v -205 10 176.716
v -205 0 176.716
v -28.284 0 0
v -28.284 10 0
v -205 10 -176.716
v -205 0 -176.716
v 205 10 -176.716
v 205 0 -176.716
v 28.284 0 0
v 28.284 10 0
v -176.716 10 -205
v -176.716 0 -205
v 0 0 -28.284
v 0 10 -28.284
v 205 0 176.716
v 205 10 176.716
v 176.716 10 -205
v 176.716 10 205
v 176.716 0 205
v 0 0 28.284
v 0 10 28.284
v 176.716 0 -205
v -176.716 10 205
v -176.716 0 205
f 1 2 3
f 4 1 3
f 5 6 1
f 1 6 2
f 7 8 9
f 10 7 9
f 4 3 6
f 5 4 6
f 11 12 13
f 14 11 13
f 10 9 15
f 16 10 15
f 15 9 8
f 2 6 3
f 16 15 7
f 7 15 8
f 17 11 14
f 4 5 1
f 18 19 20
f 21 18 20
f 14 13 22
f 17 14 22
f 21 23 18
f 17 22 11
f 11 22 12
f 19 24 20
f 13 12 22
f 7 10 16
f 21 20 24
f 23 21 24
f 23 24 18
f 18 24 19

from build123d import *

# Parameters (mm, degrees)
BOSS_EXTRUDE1_DEPTH   = 10
BOSS_EXTRUDE1_2_DEPTH = 10
BOSS_EXTRUDE1_3_DEPTH = 10
BOSS_EXTRUDE1_4_DEPTH = 10


with BuildPart() as part:
    # Sketch1 → Boss-Extrude1 (new body)
    with BuildSketch(Plane(origin=(0, 0, 0), x_dir=(1, 0, 0), z_dir=(0, 1, 0))):
        Polygon((-205, 176.715728753), (-205, -176.715728753), (-28.284271247, 0), align=None)
    extrude(amount=BOSS_EXTRUDE1_DEPTH)


with BuildPart() as body_2:
    # Sketch1 → Boss-Extrude1 2 (new body)
    with BuildSketch(Plane(origin=(0, 0, 0), x_dir=(1, 0, 0), z_dir=(0, 1, 0))):
        Polygon((-176.715728753, 205), (0, 28.284271247), (176.715728753, 205), align=None)
    extrude(amount=BOSS_EXTRUDE1_2_DEPTH)


with BuildPart() as body_3:
    # Sketch1 → Boss-Extrude1 3 (new body)
    with BuildSketch(Plane(origin=(0, 0, 0), x_dir=(1, 0, 0), z_dir=(0, 1, 0))):
        Polygon((205, 176.715728753), (28.284271247, 0), (205, -176.715728753), align=None)
    extrude(amount=BOSS_EXTRUDE1_3_DEPTH)


with BuildPart() as body_4:
    # Sketch1 → Boss-Extrude1 4 (new body)
    with BuildSketch(Plane(origin=(0, 0, 0), x_dir=(1, 0, 0), z_dir=(0, 1, 0))):
        Polygon((176.715728753, -205), (0, -28.284271247), (-176.715728753, -205), align=None)
    extrude(amount=BOSS_EXTRUDE1_4_DEPTH)


solid = Compound([part.part, body_2.part, body_3.part, body_4.part])
